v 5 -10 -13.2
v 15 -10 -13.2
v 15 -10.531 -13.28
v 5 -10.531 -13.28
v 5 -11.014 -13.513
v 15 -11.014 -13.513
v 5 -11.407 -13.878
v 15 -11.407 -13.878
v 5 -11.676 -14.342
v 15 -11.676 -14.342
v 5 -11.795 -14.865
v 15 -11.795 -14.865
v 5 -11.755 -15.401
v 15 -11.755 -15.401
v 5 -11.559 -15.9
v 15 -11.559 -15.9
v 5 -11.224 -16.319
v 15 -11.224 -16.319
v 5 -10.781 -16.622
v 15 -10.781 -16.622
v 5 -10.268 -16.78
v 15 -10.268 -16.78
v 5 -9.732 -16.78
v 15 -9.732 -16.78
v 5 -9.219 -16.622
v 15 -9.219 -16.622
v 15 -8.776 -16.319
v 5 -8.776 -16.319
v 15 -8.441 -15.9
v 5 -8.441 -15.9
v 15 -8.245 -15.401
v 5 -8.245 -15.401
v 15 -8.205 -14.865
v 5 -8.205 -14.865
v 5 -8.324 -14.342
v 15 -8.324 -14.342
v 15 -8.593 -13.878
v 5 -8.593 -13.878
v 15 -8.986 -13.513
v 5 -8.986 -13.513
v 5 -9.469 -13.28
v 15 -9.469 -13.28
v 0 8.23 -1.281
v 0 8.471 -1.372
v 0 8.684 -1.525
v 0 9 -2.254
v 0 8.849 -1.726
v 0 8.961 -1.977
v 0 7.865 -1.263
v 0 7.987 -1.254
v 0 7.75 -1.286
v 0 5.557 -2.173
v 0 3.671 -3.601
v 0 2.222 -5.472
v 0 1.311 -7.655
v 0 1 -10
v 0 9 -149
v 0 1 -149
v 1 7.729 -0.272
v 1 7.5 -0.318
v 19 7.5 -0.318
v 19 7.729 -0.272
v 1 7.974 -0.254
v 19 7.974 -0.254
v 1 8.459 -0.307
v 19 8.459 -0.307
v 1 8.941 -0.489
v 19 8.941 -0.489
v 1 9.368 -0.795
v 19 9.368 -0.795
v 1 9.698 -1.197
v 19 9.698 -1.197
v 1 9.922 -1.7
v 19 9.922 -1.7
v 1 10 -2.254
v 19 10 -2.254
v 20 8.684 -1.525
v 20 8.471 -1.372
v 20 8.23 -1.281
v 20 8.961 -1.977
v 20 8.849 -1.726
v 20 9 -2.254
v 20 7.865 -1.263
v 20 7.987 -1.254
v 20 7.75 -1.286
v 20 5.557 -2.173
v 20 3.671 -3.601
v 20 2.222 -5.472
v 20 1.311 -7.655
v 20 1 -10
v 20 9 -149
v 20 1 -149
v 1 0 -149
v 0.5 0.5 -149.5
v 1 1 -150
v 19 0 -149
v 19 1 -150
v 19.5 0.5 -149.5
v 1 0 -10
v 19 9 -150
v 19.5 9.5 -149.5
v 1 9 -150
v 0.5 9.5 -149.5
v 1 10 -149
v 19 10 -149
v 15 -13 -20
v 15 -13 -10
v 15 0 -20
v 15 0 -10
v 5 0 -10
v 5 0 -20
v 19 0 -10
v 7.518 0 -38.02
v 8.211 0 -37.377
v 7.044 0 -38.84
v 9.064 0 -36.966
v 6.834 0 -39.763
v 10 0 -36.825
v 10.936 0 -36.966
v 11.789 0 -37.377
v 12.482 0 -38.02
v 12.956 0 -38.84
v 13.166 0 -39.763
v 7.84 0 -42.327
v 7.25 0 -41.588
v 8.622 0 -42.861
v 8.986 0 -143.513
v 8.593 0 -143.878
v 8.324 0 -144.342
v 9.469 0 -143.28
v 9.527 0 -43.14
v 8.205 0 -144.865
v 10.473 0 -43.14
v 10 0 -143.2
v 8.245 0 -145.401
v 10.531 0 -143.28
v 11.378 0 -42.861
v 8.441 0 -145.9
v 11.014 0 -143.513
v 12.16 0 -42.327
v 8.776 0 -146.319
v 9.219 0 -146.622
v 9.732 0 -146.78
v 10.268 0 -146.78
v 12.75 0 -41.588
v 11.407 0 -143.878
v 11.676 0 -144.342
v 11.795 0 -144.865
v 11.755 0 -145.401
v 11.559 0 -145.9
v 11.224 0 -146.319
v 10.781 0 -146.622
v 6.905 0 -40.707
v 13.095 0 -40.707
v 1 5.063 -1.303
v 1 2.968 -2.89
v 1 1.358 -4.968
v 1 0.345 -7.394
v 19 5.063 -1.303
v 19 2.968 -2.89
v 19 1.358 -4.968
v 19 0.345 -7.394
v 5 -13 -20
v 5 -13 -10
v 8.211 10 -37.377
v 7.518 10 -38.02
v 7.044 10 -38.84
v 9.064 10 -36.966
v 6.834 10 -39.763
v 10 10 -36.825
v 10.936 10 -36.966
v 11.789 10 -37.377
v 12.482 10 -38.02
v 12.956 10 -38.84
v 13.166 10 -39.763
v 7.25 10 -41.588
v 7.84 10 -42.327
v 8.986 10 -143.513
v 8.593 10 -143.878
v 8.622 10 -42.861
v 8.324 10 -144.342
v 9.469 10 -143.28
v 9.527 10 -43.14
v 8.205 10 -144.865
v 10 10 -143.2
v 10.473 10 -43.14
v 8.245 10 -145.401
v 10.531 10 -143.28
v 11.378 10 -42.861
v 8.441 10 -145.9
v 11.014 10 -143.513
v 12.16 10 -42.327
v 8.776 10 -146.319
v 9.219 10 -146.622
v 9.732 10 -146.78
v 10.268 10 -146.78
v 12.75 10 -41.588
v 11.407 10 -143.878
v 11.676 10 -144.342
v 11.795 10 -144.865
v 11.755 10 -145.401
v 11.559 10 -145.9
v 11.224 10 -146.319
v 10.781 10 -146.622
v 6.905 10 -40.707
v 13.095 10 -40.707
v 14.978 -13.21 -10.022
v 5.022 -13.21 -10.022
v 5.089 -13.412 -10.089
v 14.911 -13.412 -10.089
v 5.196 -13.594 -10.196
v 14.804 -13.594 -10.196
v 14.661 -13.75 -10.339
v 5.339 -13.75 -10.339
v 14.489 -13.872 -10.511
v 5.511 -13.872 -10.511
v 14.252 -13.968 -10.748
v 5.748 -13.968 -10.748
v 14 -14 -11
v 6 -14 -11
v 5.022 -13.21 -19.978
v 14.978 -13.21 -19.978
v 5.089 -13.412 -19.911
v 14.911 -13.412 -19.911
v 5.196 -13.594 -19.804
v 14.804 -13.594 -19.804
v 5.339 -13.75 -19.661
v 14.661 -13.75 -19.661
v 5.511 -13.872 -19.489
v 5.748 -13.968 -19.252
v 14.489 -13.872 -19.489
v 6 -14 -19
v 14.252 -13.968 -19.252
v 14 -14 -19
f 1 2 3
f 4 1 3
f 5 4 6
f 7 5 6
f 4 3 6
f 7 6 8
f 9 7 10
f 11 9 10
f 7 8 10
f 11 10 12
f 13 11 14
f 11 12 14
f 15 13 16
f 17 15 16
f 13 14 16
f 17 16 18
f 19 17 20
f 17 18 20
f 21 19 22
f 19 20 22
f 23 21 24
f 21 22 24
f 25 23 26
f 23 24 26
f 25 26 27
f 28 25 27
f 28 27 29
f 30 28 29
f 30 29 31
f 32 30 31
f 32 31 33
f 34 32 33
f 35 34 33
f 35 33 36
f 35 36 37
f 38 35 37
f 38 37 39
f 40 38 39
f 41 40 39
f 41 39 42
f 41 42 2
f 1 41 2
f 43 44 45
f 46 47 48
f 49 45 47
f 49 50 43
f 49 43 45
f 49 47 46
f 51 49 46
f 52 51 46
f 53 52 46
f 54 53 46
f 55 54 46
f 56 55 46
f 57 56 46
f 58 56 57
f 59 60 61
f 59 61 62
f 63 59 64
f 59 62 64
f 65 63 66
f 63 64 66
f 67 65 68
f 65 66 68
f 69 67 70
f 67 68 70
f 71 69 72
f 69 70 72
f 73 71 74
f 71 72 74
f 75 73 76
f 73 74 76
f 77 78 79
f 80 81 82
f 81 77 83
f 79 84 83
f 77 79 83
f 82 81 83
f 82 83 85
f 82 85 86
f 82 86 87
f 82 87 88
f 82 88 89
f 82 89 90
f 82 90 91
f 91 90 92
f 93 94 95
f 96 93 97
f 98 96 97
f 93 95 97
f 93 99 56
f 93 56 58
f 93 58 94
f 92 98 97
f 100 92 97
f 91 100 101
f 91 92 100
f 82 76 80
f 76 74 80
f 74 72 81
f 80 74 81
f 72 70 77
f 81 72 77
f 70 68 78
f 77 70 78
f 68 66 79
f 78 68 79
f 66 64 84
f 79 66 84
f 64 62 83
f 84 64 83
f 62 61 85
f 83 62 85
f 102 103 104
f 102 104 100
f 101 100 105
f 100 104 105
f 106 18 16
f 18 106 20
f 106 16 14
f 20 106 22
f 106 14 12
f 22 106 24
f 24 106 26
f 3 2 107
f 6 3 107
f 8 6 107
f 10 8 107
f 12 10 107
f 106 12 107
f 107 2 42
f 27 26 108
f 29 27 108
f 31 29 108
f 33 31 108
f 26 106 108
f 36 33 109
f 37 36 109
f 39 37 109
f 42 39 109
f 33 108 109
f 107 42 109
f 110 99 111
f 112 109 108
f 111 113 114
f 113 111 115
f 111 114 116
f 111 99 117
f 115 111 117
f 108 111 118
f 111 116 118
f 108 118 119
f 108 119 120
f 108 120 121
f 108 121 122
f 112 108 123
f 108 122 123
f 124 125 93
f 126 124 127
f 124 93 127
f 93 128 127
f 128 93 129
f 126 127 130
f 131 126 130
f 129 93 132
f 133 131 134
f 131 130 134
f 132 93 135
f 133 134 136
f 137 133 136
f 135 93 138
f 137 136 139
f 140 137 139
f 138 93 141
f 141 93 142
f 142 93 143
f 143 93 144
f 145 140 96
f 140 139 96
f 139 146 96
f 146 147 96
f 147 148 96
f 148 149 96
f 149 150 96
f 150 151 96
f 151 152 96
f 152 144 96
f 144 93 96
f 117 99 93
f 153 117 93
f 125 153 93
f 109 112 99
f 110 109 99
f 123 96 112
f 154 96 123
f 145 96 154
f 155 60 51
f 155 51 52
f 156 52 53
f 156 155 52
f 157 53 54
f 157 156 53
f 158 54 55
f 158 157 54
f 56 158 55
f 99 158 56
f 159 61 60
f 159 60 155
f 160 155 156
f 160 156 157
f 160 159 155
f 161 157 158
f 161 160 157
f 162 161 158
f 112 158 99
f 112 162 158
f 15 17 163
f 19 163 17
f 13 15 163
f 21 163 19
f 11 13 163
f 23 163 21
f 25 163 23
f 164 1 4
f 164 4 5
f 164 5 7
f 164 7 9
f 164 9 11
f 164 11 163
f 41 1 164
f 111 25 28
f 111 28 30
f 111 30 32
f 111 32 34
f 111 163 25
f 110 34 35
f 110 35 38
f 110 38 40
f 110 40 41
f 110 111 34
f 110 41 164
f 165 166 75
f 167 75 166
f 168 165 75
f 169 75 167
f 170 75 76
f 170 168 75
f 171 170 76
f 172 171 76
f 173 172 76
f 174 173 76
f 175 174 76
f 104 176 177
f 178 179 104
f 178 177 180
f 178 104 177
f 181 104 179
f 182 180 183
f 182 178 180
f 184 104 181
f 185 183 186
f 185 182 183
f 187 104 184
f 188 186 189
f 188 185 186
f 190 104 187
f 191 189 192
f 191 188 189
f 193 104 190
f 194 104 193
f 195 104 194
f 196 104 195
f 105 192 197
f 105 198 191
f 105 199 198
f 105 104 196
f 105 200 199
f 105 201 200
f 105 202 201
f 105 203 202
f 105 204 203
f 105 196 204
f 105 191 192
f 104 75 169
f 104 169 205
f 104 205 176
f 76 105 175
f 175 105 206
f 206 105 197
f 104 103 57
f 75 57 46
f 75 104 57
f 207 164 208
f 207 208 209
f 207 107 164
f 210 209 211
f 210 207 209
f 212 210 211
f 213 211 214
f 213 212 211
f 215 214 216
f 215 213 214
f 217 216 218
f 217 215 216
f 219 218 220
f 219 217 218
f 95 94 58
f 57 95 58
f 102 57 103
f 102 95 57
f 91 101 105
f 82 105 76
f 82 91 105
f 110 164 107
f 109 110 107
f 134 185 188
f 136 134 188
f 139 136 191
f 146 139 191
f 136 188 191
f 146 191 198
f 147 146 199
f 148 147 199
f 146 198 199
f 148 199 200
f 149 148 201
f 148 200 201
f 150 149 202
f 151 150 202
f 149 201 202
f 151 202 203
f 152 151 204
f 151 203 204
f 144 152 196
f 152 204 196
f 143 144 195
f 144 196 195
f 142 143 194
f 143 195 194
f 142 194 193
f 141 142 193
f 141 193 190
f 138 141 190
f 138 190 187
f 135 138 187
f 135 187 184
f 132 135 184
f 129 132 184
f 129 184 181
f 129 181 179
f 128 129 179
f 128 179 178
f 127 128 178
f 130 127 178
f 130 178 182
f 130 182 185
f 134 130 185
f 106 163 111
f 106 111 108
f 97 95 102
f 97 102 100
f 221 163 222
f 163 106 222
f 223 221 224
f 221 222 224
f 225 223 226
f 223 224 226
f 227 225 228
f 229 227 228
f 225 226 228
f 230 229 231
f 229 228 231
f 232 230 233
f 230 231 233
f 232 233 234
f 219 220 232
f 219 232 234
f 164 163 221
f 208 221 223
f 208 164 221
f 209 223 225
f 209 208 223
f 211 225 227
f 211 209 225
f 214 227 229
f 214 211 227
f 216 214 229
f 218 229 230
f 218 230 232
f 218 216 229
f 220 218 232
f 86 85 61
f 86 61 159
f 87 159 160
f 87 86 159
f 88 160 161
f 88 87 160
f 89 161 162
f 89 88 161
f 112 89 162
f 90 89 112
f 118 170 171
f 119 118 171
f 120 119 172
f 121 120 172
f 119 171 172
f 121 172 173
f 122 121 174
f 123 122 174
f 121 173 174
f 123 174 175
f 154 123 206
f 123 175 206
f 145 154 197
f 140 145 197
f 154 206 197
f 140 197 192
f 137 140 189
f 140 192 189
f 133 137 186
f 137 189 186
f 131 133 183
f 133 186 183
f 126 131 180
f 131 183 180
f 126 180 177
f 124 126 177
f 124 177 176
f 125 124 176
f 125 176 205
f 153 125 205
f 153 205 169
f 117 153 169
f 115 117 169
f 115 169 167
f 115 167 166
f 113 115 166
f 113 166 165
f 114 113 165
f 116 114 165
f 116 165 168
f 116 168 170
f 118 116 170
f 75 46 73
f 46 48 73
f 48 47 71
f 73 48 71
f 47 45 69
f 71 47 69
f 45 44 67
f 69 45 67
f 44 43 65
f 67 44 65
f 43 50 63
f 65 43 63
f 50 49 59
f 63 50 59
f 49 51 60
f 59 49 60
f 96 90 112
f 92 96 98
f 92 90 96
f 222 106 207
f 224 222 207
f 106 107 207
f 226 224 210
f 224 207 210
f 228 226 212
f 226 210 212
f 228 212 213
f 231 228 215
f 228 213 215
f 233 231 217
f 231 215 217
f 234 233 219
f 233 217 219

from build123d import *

# Parameters (mm, degrees)
SKETCH1_W                   = 20
SKETCH1_H                   = 150
BOSS_EXTRUDE1_DEPTH         = 10
M3_CLEARANCE_HOLE1_D        = 3.6
SKETCH3_W                   = 10
SKETCH3_H                   = 10
BOSS_EXTRUDE2_DEPTH         = 14
M3_CLEARANCE_HOLE5_D        = 3.6
F_1_4_0_25_DIAMETER_HOLE1_D = 6.35
FILLET1_R                   = 10
FILLET2_R                   = 2
CHAMFER1_SIZE               = 1
FILLET3_R                   = 1
CHAMFER2_SIZE               = 1


with BuildPart() as part:
    # Sketch1 → Boss-Extrude1 (new body)
    with BuildSketch(Plane(origin=(0, 0, 0), x_dir=(1, 0, 0), z_dir=(0, 1, 0))):
        with Locations((10, 75)):
            Rectangle(SKETCH1_W, SKETCH1_H)
    extrude(amount=BOSS_EXTRUDE1_DEPTH)

    # M3 Clearance Hole1 (through all)
    with Locations(Plane(origin=(10, 0, -145), x_dir=(0, 0, -1), z_dir=(0, -1, 0))):
        with Locations((0, 0)):
            Hole(M3_CLEARANCE_HOLE1_D / 2)

    # Sketch3 → Boss-Extrude2 (add)
    with BuildSketch(Plane.XZ):
        with Locations((10, -15)):
            Rectangle(SKETCH3_W, SKETCH3_H)
    extrude(amount=BOSS_EXTRUDE2_DEPTH)

    # M3 Clearance Hole5 (through all)
    with Locations(Plane(origin=(5, -10, -15), x_dir=(0, 0, -1), z_dir=(-1, 0, 0))):
        with Locations((0, 0)):
            Hole(M3_CLEARANCE_HOLE5_D / 2)

    # 1/4 (0.25) Diameter Hole1 (through all)
    with Locations(Plane(origin=(10, 0, -40), x_dir=(0, 0, -1), z_dir=(0, -1, 0))):
        with Locations((0, 0)):
            Hole(F_1_4_0_25_DIAMETER_HOLE1_D / 2)

    # Fillet1
    fillet1_edges = [part.edges().sort_by_distance(p)[0] for p in [
        (10, 0, 0),
    ]]
    fillet(fillet1_edges, radius=FILLET1_R - 0.0001)  # a hair under: the kernel refuses the full size

    # Fillet2
    fillet2_edges = [part.edges().sort_by_distance(p)[0] for p in [
        (10, 10, 0),
    ]]
    fillet(fillet2_edges, radius=FILLET2_R)

    # Chamfer1
    chamfer1_edges = [part.edges().sort_by_distance(p)[0] for p in [
        (20, 0, -79.99995),
        (0, 2.094314553, -3.876198607),
        (20, 10, -76.127005384),
        (0, 10, -76.127005384),
        (20, 2.094314553, -3.876198607),
        (20, 9.224752526, -0.672877867),
        (0, 9.224752526, -0.672877867),
        (0, 0, -79.99995),
        (0, 5, -150),
        (20, 5, -150),
    ]]
    chamfer(chamfer1_edges, length=CHAMFER1_SIZE)

    # Fillet3
    fillet3_edges = [part.edges().sort_by_distance(p)[0] for p in [
        (5, -14, -15),
        (10, -14, -20),
        (15, -14, -15),
        (10, -14, -10),
    ]]
    fillet(fillet3_edges, radius=FILLET3_R)

    # Chamfer2
    chamfer2_edges = [part.edges().sort_by_distance(p)[0] for p in [
        (10, 0, -150),
        (10, 10, -150),
    ]]
    chamfer(chamfer2_edges, length=CHAMFER2_SIZE)


solid = part.part
